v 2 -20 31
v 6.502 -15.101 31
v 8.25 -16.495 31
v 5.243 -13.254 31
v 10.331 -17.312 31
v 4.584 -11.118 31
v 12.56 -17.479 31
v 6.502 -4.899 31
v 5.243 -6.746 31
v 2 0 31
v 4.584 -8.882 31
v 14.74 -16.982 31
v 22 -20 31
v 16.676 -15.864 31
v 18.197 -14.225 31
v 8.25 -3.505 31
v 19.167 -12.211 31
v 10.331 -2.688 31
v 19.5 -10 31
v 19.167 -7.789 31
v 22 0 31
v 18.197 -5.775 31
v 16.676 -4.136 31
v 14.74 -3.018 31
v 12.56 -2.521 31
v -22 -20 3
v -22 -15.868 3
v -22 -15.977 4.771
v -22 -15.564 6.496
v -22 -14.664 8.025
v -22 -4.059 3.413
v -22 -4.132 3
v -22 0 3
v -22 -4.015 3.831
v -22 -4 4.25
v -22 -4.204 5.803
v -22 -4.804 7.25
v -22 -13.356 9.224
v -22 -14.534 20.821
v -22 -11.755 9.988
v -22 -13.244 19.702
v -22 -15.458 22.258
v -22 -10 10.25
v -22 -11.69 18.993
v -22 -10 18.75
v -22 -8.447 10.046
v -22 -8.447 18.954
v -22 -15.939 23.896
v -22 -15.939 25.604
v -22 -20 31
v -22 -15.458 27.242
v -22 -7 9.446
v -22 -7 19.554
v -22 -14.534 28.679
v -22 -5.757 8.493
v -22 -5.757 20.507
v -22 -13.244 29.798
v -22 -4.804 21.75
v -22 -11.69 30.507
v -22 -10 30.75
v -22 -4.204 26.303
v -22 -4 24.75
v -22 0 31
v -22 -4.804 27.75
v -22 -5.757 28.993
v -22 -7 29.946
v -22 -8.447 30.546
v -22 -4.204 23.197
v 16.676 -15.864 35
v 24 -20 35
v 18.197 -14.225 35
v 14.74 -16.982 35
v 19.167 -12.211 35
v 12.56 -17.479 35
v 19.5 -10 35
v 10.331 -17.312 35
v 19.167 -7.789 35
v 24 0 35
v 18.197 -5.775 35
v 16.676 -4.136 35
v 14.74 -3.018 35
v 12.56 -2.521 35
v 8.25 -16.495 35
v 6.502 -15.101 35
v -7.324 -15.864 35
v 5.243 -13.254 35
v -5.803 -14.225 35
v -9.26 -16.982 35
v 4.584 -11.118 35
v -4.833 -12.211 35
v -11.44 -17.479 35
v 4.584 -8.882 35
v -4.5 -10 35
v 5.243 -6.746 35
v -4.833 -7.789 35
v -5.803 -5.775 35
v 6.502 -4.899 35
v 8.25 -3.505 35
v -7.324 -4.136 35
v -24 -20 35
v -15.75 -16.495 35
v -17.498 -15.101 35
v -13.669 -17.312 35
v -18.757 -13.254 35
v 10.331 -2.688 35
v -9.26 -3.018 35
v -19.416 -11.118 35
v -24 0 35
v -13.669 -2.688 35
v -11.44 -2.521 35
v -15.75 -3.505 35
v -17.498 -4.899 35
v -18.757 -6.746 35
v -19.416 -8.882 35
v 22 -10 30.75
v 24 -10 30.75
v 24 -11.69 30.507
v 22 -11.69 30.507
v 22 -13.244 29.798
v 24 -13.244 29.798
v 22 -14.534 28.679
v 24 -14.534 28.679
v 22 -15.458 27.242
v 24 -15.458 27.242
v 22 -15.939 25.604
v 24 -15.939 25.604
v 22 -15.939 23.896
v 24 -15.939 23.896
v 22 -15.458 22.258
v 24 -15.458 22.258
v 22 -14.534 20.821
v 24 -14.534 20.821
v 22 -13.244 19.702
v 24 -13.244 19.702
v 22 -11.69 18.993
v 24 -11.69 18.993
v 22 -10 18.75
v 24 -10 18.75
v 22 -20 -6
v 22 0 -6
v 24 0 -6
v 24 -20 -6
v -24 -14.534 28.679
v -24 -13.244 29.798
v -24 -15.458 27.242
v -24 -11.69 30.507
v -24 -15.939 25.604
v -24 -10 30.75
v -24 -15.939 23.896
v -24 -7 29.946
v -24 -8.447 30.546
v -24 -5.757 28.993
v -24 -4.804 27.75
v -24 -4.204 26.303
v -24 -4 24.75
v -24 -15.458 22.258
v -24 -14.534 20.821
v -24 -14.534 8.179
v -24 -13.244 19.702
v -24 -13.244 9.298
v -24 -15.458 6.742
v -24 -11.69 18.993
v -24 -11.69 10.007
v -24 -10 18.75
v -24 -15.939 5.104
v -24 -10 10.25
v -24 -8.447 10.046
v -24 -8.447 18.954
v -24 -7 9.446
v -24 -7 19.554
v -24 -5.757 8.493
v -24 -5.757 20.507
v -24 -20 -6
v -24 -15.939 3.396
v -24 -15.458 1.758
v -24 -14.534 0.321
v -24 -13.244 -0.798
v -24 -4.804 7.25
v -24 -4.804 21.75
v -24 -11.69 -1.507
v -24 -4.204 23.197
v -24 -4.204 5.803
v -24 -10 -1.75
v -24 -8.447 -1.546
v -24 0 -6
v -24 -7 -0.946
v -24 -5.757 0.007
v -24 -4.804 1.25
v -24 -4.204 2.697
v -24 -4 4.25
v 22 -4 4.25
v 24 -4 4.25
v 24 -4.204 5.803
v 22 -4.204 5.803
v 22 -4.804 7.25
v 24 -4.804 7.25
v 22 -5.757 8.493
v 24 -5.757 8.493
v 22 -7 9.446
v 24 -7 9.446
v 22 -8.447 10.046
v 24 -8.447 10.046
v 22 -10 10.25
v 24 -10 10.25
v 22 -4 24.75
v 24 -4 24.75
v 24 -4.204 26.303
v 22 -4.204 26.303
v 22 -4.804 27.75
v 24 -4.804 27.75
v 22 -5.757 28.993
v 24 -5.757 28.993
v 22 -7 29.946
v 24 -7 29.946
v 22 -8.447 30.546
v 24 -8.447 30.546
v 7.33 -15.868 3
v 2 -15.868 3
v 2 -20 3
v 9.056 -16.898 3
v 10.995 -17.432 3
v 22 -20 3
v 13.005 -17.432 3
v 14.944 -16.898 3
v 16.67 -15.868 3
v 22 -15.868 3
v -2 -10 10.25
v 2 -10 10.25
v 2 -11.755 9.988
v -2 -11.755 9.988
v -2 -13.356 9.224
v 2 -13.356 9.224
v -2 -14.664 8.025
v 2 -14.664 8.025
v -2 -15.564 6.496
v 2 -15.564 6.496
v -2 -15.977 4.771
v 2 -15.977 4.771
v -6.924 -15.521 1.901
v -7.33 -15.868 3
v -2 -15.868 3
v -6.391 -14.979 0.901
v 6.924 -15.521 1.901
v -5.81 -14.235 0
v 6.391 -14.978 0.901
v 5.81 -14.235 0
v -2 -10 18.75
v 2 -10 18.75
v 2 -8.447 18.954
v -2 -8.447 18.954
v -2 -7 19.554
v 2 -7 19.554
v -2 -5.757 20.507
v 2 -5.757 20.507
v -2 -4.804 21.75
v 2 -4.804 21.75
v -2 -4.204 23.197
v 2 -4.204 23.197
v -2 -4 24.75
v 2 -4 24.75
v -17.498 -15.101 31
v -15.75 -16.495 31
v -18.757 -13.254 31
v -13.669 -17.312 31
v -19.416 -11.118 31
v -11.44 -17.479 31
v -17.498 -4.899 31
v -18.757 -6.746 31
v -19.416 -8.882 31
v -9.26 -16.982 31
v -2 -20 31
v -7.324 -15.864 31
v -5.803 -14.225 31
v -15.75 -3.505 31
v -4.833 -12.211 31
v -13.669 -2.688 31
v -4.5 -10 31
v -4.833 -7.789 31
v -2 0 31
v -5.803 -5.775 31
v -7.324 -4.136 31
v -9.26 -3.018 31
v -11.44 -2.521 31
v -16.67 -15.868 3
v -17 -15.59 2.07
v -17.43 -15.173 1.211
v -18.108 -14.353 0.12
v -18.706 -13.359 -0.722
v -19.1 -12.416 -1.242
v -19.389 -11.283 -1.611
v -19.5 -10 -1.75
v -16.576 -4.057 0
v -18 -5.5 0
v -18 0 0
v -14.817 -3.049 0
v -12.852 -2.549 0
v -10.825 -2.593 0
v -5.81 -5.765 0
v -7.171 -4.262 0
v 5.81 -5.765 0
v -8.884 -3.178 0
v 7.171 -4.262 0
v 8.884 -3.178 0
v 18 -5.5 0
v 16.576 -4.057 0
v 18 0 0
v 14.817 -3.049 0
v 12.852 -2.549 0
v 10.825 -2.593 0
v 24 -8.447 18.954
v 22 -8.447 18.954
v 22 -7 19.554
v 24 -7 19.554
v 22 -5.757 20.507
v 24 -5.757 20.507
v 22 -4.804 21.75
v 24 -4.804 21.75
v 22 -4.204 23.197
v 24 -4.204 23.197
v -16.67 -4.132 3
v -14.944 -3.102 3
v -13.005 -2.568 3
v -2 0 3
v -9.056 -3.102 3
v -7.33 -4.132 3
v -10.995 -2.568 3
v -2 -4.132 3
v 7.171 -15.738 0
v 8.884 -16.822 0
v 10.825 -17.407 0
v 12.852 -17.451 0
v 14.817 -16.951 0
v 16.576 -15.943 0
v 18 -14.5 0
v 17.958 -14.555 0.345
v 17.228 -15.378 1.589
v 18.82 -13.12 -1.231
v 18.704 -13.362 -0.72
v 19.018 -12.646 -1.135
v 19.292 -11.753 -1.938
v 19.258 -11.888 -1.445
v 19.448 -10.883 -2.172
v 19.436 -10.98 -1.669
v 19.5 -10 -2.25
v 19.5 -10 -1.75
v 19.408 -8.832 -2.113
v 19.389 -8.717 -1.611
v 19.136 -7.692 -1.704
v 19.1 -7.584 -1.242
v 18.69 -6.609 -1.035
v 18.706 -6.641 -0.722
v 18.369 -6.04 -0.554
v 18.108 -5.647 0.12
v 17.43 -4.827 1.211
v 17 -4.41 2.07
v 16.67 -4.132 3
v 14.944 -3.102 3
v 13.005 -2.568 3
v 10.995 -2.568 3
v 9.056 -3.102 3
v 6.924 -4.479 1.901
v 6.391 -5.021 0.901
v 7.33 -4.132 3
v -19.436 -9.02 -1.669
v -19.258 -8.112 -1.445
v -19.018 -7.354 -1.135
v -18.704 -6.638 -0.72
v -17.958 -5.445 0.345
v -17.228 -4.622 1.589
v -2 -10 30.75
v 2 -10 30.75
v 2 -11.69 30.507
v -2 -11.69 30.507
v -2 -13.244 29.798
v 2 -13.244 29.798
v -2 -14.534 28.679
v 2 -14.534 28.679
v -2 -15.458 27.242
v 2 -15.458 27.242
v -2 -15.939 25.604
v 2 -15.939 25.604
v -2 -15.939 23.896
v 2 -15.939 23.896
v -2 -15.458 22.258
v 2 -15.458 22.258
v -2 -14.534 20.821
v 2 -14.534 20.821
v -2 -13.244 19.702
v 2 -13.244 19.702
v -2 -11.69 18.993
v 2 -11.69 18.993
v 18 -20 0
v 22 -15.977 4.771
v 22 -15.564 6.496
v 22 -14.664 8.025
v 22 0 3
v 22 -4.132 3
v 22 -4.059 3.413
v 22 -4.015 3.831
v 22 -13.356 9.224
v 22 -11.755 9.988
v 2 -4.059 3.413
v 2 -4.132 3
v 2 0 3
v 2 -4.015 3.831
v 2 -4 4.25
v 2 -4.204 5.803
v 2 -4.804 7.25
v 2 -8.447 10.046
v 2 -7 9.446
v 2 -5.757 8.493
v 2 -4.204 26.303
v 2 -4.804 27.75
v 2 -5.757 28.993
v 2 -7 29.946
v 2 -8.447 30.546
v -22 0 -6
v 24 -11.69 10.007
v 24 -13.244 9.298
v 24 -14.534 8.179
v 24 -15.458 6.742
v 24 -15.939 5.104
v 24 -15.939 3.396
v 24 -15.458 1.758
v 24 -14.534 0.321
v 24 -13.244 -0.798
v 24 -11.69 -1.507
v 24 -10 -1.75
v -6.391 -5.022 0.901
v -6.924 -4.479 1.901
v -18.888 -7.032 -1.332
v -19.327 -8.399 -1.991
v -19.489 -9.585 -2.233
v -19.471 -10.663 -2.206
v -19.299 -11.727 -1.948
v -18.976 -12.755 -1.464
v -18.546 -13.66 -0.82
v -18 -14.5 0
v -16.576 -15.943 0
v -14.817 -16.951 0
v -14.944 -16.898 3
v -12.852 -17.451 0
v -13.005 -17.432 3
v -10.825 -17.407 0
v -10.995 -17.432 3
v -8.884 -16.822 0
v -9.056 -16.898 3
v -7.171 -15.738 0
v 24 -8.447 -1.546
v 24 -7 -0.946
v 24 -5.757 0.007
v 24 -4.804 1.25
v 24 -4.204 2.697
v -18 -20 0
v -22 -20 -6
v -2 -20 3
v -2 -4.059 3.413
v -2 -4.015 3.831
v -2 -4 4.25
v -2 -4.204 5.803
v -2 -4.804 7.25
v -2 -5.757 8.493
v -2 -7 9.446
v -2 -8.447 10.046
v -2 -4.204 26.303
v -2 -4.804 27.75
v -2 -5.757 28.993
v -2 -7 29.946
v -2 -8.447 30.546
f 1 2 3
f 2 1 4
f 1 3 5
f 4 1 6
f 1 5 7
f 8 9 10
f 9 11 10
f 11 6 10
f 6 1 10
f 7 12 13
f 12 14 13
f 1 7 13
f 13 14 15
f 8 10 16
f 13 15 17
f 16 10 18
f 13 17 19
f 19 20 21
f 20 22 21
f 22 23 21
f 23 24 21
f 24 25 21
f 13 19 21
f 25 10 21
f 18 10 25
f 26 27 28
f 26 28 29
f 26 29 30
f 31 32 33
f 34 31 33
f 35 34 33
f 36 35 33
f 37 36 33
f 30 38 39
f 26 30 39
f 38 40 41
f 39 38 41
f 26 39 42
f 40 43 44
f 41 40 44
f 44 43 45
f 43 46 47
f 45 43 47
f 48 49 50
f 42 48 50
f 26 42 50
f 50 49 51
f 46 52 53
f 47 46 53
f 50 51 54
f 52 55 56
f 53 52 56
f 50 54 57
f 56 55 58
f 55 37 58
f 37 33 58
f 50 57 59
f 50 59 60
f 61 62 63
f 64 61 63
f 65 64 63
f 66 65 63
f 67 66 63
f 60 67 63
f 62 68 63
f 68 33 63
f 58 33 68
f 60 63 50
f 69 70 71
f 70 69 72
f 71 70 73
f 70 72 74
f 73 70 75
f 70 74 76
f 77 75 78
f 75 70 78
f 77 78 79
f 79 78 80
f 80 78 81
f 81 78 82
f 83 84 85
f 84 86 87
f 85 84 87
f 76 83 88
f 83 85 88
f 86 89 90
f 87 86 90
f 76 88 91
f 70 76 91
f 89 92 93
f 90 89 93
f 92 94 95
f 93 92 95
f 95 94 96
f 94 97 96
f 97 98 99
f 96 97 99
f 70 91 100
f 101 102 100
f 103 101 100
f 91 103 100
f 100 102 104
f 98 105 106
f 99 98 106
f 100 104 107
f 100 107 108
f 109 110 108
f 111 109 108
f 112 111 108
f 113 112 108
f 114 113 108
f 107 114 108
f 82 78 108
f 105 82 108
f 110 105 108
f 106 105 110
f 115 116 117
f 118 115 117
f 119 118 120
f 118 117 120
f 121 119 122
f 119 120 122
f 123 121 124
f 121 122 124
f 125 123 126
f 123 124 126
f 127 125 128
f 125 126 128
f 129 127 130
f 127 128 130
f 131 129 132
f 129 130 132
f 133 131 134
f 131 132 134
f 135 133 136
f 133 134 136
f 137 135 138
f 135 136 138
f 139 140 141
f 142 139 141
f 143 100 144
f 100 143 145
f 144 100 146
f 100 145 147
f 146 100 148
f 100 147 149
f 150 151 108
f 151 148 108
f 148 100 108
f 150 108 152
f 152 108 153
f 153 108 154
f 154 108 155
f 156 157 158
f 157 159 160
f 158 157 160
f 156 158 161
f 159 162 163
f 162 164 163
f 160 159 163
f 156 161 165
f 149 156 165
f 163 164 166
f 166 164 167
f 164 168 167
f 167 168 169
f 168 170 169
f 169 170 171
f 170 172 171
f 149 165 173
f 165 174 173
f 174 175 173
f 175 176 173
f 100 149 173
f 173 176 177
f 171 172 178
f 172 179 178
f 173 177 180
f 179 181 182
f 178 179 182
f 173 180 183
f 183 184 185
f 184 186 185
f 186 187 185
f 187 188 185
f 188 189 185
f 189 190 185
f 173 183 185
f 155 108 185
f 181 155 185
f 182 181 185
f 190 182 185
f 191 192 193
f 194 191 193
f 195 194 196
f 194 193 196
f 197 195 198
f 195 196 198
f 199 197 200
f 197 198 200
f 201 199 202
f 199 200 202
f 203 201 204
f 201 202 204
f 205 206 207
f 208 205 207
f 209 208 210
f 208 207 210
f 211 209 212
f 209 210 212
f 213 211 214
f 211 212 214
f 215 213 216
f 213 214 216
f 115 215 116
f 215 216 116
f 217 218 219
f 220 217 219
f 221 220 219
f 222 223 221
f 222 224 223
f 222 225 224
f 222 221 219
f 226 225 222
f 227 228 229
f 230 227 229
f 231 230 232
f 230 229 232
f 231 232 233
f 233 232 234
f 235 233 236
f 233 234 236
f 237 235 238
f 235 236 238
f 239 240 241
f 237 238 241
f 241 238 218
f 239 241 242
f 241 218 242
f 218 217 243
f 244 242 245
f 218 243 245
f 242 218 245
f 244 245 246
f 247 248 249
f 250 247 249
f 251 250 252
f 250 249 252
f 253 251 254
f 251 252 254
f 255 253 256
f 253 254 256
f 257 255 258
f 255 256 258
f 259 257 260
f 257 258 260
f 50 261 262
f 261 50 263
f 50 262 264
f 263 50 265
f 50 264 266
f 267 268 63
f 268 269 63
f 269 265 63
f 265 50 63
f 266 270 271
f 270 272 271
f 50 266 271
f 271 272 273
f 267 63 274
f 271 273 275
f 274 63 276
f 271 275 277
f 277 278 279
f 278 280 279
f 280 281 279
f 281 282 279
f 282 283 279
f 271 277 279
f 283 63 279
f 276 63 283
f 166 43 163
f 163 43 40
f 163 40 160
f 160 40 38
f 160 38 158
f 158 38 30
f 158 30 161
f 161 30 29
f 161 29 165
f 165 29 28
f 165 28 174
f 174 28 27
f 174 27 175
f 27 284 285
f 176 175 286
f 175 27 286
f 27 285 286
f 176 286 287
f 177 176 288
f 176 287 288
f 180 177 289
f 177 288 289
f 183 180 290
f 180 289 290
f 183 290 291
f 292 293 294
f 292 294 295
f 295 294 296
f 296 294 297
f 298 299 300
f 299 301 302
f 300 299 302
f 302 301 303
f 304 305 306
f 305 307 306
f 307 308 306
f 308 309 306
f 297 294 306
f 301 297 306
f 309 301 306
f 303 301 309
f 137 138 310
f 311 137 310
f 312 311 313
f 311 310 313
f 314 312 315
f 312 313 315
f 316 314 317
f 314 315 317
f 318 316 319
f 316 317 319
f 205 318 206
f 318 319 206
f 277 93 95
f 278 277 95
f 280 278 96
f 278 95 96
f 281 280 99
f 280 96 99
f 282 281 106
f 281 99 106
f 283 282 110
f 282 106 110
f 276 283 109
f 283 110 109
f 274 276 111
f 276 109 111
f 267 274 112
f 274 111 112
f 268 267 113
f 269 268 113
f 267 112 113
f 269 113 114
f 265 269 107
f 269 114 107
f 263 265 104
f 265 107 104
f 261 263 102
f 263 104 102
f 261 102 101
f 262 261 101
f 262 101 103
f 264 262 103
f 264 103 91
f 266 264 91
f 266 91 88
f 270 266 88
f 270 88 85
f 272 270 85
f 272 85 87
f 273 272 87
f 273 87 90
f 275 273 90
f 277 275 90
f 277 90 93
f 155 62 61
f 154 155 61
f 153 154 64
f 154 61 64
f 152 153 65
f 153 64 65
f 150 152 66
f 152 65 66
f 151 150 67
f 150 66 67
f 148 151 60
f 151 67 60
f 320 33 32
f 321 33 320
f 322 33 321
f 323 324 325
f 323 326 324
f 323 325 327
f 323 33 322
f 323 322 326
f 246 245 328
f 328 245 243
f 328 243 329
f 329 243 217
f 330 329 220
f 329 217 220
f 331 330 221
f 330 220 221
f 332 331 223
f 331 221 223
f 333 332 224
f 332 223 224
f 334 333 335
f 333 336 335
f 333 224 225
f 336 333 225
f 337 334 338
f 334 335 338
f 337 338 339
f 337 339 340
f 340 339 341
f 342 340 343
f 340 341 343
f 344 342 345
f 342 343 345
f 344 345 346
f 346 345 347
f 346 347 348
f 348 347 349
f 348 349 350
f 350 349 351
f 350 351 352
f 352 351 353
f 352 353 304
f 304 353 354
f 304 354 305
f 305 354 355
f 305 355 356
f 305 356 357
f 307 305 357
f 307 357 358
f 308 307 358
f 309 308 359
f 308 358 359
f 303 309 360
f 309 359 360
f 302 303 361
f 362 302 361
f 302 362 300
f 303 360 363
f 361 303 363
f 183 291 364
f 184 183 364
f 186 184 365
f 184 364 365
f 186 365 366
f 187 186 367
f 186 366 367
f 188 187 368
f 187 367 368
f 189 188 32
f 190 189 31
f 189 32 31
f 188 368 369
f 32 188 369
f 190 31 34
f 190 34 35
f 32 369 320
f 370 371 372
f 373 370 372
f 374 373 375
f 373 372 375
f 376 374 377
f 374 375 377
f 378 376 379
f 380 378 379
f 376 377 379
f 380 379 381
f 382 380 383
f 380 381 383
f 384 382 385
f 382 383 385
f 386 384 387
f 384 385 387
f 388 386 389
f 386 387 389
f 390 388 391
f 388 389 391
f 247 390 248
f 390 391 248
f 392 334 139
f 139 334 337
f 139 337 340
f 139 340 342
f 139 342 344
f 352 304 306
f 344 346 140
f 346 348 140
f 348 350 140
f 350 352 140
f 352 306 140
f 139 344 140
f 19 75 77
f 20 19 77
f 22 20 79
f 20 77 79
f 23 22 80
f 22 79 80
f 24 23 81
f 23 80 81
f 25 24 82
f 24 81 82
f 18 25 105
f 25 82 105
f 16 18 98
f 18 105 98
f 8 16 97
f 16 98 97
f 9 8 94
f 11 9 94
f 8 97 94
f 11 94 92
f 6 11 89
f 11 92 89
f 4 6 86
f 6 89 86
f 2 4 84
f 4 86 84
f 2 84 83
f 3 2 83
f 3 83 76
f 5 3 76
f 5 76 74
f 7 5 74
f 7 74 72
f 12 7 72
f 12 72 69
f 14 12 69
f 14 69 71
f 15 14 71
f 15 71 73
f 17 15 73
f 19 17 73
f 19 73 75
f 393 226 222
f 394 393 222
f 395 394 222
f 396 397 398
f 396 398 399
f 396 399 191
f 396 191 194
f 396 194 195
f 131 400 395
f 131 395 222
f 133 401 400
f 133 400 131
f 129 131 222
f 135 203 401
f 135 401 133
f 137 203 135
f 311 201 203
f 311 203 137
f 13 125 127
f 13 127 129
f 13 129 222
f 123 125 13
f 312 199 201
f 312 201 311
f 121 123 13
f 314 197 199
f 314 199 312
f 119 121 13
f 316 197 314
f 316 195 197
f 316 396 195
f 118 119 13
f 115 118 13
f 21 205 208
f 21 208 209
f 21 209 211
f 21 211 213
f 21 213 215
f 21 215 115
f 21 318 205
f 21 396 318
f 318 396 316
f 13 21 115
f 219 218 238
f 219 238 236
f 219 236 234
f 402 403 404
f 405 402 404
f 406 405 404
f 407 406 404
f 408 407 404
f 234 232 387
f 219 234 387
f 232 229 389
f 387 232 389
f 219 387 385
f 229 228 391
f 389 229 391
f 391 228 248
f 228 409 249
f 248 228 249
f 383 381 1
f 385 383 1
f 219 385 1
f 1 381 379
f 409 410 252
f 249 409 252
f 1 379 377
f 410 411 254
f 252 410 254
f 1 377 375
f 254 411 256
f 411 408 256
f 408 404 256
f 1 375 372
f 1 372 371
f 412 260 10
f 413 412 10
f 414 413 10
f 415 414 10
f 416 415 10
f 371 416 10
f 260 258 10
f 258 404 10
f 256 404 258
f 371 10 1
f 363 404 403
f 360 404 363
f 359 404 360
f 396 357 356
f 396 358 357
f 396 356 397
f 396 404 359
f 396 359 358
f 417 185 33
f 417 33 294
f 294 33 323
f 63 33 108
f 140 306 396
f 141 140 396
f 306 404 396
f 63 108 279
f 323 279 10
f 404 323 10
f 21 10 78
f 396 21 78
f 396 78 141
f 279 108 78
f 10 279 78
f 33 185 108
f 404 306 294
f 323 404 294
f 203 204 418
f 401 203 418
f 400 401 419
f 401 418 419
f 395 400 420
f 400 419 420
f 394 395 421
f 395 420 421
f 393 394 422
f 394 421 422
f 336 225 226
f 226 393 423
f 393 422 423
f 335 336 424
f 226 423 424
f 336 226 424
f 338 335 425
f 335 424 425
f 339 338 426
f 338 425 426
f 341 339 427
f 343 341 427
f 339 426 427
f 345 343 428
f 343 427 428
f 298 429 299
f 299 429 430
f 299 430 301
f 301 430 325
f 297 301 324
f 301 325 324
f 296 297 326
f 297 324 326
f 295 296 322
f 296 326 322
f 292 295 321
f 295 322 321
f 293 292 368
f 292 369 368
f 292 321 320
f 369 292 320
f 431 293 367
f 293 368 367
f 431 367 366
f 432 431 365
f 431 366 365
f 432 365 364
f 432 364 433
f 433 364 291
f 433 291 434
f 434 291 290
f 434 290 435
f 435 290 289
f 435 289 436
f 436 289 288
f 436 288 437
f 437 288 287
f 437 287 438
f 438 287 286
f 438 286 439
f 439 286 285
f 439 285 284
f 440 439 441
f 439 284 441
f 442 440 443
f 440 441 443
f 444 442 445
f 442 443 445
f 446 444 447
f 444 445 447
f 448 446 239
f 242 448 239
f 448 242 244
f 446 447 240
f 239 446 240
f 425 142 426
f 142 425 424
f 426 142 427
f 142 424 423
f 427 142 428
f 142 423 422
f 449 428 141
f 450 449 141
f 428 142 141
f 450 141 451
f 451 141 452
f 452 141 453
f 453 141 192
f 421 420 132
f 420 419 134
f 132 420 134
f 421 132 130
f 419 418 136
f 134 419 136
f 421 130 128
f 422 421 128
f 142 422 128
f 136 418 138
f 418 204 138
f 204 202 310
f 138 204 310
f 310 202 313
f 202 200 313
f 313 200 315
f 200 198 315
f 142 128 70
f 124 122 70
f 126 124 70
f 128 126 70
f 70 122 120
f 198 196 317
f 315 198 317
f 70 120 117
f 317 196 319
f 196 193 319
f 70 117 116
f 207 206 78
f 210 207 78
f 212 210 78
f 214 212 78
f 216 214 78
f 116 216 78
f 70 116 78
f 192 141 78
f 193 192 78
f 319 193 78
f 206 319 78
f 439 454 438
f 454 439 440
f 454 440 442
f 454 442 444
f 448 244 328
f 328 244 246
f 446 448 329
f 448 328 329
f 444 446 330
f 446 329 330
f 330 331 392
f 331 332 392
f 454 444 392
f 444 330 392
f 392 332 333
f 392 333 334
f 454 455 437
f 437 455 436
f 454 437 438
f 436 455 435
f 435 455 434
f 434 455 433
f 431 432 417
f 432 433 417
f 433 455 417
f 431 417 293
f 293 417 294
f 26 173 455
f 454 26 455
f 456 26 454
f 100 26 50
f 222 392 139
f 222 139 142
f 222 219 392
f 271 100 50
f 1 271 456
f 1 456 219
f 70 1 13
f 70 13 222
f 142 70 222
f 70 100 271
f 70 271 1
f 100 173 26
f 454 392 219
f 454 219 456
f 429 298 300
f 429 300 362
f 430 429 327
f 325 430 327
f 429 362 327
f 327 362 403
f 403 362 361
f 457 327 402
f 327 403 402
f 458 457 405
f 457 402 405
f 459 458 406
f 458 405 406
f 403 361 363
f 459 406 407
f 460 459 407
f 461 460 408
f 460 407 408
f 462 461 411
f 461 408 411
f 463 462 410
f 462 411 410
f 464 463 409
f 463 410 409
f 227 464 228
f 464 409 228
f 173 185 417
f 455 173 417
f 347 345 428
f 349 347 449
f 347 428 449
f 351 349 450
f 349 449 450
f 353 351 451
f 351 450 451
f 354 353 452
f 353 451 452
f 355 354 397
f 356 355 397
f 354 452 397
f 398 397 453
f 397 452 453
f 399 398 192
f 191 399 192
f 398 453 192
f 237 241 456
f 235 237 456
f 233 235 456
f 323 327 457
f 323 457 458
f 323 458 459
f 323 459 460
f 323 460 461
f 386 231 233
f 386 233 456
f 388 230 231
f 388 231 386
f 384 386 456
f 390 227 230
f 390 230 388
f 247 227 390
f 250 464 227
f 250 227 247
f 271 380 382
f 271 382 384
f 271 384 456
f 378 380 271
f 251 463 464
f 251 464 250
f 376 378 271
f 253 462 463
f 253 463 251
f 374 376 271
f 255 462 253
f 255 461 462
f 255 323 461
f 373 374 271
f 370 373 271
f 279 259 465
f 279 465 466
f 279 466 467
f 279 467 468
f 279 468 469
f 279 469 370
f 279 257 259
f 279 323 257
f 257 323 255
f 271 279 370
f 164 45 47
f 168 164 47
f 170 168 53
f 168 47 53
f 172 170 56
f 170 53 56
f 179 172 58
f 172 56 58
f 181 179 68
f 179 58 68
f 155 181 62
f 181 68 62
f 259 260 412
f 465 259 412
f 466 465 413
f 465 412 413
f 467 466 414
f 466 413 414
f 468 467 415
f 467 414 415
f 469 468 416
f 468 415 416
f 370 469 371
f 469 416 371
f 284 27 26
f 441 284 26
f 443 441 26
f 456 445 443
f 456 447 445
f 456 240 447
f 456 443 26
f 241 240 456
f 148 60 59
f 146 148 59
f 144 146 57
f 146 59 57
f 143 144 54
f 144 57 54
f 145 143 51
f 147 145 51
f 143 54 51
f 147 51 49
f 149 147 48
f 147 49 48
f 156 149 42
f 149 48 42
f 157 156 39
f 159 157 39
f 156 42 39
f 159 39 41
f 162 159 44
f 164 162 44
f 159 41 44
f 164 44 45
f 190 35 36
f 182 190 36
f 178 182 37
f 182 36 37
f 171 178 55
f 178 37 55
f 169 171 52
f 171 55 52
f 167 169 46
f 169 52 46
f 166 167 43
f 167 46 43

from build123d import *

# Parameters (mm, degrees)
F0_W     = 20
F0_H     = 28
F1_DEPTH = 20
F3_DEPTH = 50
F5_DEPTH = 50


with BuildPart() as f1:
    # F0 (on Front) → F1 (new body)
    with BuildSketch(Plane.XZ):
        Polygon((0, 3), (0, 0), (18, 0), (22, -6), (24, -6), (24, 35), (22, 35), (0, 35), align=None)
        with Locations((12, 17)):
            Rectangle(F0_W, F0_H, mode=Mode.SUBTRACT)
        Polygon((-18, 0), (0, 0), (0, 3), (0, 35), (-22, 35), (-24, 35), (-24, -6), (-22, -6), align=None)
        with Locations((-12, 17)):
            Rectangle(F0_W, F0_H, mode=Mode.SUBTRACT)
    extrude(amount=F1_DEPTH)

    # F2 (on face) → F3 (cut)
    with BuildSketch(Plane.XY.offset(35)):
        with BuildLine():
            ThreePointArc((-19.5, -10), (-12, -17.5), (-4.5, -10))
            Line((-4.5, -10), (-19.5, -10))
        make_face()
        with BuildLine():
            Line((-19.5, -10), (-4.5, -10))
            ThreePointArc((-4.5, -10), (-12, -2.5), (-19.5, -10))
        make_face()
        with BuildLine():
            Line((19.5, -10), (4.5, -10))
            ThreePointArc((4.5, -10), (12, -17.5), (19.5, -10))
        make_face()
        with BuildLine():
            ThreePointArc((19.5, -10), (12, -2.5), (4.5, -10))
            Line((4.5, -10), (19.5, -10))
        make_face()
    extrude(amount=-F3_DEPTH, mode=Mode.SUBTRACT)

    # F4 (on face) → F5 (cut)
    with BuildSketch(Plane.YZ.offset(24)):
        with BuildLine():
            ThreePointArc((-10, 30.75), (-16, 24.75), (-10, 18.75))
            Line((-10, 18.75), (-10, 30.75))
        make_face()
        with BuildLine():
            Line((-10, 30.75), (-10, 18.75))
            ThreePointArc((-10, 18.75), (-5.7573593129, 20.5073593129), (-4, 24.75))
            ThreePointArc((-4, 24.75), (-5.7573593129, 28.9926406871), (-10, 30.75))
        make_face()
        with BuildLine():
            Line((-10, 10.25), (-10, -1.75))
            ThreePointArc((-10, -1.75), (-5.7573593129, 0.0073593129), (-4, 4.25))
            ThreePointArc((-4, 4.25), (-5.7573593129, 8.4926406871), (-10, 10.25))
        make_face()
        with BuildLine():
            ThreePointArc((-10, 10.25), (-16, 4.25), (-10, -1.75))
            Line((-10, -1.75), (-10, 10.25))
        make_face()
    extrude(amount=-F5_DEPTH, mode=Mode.SUBTRACT)


solid = f1.part
